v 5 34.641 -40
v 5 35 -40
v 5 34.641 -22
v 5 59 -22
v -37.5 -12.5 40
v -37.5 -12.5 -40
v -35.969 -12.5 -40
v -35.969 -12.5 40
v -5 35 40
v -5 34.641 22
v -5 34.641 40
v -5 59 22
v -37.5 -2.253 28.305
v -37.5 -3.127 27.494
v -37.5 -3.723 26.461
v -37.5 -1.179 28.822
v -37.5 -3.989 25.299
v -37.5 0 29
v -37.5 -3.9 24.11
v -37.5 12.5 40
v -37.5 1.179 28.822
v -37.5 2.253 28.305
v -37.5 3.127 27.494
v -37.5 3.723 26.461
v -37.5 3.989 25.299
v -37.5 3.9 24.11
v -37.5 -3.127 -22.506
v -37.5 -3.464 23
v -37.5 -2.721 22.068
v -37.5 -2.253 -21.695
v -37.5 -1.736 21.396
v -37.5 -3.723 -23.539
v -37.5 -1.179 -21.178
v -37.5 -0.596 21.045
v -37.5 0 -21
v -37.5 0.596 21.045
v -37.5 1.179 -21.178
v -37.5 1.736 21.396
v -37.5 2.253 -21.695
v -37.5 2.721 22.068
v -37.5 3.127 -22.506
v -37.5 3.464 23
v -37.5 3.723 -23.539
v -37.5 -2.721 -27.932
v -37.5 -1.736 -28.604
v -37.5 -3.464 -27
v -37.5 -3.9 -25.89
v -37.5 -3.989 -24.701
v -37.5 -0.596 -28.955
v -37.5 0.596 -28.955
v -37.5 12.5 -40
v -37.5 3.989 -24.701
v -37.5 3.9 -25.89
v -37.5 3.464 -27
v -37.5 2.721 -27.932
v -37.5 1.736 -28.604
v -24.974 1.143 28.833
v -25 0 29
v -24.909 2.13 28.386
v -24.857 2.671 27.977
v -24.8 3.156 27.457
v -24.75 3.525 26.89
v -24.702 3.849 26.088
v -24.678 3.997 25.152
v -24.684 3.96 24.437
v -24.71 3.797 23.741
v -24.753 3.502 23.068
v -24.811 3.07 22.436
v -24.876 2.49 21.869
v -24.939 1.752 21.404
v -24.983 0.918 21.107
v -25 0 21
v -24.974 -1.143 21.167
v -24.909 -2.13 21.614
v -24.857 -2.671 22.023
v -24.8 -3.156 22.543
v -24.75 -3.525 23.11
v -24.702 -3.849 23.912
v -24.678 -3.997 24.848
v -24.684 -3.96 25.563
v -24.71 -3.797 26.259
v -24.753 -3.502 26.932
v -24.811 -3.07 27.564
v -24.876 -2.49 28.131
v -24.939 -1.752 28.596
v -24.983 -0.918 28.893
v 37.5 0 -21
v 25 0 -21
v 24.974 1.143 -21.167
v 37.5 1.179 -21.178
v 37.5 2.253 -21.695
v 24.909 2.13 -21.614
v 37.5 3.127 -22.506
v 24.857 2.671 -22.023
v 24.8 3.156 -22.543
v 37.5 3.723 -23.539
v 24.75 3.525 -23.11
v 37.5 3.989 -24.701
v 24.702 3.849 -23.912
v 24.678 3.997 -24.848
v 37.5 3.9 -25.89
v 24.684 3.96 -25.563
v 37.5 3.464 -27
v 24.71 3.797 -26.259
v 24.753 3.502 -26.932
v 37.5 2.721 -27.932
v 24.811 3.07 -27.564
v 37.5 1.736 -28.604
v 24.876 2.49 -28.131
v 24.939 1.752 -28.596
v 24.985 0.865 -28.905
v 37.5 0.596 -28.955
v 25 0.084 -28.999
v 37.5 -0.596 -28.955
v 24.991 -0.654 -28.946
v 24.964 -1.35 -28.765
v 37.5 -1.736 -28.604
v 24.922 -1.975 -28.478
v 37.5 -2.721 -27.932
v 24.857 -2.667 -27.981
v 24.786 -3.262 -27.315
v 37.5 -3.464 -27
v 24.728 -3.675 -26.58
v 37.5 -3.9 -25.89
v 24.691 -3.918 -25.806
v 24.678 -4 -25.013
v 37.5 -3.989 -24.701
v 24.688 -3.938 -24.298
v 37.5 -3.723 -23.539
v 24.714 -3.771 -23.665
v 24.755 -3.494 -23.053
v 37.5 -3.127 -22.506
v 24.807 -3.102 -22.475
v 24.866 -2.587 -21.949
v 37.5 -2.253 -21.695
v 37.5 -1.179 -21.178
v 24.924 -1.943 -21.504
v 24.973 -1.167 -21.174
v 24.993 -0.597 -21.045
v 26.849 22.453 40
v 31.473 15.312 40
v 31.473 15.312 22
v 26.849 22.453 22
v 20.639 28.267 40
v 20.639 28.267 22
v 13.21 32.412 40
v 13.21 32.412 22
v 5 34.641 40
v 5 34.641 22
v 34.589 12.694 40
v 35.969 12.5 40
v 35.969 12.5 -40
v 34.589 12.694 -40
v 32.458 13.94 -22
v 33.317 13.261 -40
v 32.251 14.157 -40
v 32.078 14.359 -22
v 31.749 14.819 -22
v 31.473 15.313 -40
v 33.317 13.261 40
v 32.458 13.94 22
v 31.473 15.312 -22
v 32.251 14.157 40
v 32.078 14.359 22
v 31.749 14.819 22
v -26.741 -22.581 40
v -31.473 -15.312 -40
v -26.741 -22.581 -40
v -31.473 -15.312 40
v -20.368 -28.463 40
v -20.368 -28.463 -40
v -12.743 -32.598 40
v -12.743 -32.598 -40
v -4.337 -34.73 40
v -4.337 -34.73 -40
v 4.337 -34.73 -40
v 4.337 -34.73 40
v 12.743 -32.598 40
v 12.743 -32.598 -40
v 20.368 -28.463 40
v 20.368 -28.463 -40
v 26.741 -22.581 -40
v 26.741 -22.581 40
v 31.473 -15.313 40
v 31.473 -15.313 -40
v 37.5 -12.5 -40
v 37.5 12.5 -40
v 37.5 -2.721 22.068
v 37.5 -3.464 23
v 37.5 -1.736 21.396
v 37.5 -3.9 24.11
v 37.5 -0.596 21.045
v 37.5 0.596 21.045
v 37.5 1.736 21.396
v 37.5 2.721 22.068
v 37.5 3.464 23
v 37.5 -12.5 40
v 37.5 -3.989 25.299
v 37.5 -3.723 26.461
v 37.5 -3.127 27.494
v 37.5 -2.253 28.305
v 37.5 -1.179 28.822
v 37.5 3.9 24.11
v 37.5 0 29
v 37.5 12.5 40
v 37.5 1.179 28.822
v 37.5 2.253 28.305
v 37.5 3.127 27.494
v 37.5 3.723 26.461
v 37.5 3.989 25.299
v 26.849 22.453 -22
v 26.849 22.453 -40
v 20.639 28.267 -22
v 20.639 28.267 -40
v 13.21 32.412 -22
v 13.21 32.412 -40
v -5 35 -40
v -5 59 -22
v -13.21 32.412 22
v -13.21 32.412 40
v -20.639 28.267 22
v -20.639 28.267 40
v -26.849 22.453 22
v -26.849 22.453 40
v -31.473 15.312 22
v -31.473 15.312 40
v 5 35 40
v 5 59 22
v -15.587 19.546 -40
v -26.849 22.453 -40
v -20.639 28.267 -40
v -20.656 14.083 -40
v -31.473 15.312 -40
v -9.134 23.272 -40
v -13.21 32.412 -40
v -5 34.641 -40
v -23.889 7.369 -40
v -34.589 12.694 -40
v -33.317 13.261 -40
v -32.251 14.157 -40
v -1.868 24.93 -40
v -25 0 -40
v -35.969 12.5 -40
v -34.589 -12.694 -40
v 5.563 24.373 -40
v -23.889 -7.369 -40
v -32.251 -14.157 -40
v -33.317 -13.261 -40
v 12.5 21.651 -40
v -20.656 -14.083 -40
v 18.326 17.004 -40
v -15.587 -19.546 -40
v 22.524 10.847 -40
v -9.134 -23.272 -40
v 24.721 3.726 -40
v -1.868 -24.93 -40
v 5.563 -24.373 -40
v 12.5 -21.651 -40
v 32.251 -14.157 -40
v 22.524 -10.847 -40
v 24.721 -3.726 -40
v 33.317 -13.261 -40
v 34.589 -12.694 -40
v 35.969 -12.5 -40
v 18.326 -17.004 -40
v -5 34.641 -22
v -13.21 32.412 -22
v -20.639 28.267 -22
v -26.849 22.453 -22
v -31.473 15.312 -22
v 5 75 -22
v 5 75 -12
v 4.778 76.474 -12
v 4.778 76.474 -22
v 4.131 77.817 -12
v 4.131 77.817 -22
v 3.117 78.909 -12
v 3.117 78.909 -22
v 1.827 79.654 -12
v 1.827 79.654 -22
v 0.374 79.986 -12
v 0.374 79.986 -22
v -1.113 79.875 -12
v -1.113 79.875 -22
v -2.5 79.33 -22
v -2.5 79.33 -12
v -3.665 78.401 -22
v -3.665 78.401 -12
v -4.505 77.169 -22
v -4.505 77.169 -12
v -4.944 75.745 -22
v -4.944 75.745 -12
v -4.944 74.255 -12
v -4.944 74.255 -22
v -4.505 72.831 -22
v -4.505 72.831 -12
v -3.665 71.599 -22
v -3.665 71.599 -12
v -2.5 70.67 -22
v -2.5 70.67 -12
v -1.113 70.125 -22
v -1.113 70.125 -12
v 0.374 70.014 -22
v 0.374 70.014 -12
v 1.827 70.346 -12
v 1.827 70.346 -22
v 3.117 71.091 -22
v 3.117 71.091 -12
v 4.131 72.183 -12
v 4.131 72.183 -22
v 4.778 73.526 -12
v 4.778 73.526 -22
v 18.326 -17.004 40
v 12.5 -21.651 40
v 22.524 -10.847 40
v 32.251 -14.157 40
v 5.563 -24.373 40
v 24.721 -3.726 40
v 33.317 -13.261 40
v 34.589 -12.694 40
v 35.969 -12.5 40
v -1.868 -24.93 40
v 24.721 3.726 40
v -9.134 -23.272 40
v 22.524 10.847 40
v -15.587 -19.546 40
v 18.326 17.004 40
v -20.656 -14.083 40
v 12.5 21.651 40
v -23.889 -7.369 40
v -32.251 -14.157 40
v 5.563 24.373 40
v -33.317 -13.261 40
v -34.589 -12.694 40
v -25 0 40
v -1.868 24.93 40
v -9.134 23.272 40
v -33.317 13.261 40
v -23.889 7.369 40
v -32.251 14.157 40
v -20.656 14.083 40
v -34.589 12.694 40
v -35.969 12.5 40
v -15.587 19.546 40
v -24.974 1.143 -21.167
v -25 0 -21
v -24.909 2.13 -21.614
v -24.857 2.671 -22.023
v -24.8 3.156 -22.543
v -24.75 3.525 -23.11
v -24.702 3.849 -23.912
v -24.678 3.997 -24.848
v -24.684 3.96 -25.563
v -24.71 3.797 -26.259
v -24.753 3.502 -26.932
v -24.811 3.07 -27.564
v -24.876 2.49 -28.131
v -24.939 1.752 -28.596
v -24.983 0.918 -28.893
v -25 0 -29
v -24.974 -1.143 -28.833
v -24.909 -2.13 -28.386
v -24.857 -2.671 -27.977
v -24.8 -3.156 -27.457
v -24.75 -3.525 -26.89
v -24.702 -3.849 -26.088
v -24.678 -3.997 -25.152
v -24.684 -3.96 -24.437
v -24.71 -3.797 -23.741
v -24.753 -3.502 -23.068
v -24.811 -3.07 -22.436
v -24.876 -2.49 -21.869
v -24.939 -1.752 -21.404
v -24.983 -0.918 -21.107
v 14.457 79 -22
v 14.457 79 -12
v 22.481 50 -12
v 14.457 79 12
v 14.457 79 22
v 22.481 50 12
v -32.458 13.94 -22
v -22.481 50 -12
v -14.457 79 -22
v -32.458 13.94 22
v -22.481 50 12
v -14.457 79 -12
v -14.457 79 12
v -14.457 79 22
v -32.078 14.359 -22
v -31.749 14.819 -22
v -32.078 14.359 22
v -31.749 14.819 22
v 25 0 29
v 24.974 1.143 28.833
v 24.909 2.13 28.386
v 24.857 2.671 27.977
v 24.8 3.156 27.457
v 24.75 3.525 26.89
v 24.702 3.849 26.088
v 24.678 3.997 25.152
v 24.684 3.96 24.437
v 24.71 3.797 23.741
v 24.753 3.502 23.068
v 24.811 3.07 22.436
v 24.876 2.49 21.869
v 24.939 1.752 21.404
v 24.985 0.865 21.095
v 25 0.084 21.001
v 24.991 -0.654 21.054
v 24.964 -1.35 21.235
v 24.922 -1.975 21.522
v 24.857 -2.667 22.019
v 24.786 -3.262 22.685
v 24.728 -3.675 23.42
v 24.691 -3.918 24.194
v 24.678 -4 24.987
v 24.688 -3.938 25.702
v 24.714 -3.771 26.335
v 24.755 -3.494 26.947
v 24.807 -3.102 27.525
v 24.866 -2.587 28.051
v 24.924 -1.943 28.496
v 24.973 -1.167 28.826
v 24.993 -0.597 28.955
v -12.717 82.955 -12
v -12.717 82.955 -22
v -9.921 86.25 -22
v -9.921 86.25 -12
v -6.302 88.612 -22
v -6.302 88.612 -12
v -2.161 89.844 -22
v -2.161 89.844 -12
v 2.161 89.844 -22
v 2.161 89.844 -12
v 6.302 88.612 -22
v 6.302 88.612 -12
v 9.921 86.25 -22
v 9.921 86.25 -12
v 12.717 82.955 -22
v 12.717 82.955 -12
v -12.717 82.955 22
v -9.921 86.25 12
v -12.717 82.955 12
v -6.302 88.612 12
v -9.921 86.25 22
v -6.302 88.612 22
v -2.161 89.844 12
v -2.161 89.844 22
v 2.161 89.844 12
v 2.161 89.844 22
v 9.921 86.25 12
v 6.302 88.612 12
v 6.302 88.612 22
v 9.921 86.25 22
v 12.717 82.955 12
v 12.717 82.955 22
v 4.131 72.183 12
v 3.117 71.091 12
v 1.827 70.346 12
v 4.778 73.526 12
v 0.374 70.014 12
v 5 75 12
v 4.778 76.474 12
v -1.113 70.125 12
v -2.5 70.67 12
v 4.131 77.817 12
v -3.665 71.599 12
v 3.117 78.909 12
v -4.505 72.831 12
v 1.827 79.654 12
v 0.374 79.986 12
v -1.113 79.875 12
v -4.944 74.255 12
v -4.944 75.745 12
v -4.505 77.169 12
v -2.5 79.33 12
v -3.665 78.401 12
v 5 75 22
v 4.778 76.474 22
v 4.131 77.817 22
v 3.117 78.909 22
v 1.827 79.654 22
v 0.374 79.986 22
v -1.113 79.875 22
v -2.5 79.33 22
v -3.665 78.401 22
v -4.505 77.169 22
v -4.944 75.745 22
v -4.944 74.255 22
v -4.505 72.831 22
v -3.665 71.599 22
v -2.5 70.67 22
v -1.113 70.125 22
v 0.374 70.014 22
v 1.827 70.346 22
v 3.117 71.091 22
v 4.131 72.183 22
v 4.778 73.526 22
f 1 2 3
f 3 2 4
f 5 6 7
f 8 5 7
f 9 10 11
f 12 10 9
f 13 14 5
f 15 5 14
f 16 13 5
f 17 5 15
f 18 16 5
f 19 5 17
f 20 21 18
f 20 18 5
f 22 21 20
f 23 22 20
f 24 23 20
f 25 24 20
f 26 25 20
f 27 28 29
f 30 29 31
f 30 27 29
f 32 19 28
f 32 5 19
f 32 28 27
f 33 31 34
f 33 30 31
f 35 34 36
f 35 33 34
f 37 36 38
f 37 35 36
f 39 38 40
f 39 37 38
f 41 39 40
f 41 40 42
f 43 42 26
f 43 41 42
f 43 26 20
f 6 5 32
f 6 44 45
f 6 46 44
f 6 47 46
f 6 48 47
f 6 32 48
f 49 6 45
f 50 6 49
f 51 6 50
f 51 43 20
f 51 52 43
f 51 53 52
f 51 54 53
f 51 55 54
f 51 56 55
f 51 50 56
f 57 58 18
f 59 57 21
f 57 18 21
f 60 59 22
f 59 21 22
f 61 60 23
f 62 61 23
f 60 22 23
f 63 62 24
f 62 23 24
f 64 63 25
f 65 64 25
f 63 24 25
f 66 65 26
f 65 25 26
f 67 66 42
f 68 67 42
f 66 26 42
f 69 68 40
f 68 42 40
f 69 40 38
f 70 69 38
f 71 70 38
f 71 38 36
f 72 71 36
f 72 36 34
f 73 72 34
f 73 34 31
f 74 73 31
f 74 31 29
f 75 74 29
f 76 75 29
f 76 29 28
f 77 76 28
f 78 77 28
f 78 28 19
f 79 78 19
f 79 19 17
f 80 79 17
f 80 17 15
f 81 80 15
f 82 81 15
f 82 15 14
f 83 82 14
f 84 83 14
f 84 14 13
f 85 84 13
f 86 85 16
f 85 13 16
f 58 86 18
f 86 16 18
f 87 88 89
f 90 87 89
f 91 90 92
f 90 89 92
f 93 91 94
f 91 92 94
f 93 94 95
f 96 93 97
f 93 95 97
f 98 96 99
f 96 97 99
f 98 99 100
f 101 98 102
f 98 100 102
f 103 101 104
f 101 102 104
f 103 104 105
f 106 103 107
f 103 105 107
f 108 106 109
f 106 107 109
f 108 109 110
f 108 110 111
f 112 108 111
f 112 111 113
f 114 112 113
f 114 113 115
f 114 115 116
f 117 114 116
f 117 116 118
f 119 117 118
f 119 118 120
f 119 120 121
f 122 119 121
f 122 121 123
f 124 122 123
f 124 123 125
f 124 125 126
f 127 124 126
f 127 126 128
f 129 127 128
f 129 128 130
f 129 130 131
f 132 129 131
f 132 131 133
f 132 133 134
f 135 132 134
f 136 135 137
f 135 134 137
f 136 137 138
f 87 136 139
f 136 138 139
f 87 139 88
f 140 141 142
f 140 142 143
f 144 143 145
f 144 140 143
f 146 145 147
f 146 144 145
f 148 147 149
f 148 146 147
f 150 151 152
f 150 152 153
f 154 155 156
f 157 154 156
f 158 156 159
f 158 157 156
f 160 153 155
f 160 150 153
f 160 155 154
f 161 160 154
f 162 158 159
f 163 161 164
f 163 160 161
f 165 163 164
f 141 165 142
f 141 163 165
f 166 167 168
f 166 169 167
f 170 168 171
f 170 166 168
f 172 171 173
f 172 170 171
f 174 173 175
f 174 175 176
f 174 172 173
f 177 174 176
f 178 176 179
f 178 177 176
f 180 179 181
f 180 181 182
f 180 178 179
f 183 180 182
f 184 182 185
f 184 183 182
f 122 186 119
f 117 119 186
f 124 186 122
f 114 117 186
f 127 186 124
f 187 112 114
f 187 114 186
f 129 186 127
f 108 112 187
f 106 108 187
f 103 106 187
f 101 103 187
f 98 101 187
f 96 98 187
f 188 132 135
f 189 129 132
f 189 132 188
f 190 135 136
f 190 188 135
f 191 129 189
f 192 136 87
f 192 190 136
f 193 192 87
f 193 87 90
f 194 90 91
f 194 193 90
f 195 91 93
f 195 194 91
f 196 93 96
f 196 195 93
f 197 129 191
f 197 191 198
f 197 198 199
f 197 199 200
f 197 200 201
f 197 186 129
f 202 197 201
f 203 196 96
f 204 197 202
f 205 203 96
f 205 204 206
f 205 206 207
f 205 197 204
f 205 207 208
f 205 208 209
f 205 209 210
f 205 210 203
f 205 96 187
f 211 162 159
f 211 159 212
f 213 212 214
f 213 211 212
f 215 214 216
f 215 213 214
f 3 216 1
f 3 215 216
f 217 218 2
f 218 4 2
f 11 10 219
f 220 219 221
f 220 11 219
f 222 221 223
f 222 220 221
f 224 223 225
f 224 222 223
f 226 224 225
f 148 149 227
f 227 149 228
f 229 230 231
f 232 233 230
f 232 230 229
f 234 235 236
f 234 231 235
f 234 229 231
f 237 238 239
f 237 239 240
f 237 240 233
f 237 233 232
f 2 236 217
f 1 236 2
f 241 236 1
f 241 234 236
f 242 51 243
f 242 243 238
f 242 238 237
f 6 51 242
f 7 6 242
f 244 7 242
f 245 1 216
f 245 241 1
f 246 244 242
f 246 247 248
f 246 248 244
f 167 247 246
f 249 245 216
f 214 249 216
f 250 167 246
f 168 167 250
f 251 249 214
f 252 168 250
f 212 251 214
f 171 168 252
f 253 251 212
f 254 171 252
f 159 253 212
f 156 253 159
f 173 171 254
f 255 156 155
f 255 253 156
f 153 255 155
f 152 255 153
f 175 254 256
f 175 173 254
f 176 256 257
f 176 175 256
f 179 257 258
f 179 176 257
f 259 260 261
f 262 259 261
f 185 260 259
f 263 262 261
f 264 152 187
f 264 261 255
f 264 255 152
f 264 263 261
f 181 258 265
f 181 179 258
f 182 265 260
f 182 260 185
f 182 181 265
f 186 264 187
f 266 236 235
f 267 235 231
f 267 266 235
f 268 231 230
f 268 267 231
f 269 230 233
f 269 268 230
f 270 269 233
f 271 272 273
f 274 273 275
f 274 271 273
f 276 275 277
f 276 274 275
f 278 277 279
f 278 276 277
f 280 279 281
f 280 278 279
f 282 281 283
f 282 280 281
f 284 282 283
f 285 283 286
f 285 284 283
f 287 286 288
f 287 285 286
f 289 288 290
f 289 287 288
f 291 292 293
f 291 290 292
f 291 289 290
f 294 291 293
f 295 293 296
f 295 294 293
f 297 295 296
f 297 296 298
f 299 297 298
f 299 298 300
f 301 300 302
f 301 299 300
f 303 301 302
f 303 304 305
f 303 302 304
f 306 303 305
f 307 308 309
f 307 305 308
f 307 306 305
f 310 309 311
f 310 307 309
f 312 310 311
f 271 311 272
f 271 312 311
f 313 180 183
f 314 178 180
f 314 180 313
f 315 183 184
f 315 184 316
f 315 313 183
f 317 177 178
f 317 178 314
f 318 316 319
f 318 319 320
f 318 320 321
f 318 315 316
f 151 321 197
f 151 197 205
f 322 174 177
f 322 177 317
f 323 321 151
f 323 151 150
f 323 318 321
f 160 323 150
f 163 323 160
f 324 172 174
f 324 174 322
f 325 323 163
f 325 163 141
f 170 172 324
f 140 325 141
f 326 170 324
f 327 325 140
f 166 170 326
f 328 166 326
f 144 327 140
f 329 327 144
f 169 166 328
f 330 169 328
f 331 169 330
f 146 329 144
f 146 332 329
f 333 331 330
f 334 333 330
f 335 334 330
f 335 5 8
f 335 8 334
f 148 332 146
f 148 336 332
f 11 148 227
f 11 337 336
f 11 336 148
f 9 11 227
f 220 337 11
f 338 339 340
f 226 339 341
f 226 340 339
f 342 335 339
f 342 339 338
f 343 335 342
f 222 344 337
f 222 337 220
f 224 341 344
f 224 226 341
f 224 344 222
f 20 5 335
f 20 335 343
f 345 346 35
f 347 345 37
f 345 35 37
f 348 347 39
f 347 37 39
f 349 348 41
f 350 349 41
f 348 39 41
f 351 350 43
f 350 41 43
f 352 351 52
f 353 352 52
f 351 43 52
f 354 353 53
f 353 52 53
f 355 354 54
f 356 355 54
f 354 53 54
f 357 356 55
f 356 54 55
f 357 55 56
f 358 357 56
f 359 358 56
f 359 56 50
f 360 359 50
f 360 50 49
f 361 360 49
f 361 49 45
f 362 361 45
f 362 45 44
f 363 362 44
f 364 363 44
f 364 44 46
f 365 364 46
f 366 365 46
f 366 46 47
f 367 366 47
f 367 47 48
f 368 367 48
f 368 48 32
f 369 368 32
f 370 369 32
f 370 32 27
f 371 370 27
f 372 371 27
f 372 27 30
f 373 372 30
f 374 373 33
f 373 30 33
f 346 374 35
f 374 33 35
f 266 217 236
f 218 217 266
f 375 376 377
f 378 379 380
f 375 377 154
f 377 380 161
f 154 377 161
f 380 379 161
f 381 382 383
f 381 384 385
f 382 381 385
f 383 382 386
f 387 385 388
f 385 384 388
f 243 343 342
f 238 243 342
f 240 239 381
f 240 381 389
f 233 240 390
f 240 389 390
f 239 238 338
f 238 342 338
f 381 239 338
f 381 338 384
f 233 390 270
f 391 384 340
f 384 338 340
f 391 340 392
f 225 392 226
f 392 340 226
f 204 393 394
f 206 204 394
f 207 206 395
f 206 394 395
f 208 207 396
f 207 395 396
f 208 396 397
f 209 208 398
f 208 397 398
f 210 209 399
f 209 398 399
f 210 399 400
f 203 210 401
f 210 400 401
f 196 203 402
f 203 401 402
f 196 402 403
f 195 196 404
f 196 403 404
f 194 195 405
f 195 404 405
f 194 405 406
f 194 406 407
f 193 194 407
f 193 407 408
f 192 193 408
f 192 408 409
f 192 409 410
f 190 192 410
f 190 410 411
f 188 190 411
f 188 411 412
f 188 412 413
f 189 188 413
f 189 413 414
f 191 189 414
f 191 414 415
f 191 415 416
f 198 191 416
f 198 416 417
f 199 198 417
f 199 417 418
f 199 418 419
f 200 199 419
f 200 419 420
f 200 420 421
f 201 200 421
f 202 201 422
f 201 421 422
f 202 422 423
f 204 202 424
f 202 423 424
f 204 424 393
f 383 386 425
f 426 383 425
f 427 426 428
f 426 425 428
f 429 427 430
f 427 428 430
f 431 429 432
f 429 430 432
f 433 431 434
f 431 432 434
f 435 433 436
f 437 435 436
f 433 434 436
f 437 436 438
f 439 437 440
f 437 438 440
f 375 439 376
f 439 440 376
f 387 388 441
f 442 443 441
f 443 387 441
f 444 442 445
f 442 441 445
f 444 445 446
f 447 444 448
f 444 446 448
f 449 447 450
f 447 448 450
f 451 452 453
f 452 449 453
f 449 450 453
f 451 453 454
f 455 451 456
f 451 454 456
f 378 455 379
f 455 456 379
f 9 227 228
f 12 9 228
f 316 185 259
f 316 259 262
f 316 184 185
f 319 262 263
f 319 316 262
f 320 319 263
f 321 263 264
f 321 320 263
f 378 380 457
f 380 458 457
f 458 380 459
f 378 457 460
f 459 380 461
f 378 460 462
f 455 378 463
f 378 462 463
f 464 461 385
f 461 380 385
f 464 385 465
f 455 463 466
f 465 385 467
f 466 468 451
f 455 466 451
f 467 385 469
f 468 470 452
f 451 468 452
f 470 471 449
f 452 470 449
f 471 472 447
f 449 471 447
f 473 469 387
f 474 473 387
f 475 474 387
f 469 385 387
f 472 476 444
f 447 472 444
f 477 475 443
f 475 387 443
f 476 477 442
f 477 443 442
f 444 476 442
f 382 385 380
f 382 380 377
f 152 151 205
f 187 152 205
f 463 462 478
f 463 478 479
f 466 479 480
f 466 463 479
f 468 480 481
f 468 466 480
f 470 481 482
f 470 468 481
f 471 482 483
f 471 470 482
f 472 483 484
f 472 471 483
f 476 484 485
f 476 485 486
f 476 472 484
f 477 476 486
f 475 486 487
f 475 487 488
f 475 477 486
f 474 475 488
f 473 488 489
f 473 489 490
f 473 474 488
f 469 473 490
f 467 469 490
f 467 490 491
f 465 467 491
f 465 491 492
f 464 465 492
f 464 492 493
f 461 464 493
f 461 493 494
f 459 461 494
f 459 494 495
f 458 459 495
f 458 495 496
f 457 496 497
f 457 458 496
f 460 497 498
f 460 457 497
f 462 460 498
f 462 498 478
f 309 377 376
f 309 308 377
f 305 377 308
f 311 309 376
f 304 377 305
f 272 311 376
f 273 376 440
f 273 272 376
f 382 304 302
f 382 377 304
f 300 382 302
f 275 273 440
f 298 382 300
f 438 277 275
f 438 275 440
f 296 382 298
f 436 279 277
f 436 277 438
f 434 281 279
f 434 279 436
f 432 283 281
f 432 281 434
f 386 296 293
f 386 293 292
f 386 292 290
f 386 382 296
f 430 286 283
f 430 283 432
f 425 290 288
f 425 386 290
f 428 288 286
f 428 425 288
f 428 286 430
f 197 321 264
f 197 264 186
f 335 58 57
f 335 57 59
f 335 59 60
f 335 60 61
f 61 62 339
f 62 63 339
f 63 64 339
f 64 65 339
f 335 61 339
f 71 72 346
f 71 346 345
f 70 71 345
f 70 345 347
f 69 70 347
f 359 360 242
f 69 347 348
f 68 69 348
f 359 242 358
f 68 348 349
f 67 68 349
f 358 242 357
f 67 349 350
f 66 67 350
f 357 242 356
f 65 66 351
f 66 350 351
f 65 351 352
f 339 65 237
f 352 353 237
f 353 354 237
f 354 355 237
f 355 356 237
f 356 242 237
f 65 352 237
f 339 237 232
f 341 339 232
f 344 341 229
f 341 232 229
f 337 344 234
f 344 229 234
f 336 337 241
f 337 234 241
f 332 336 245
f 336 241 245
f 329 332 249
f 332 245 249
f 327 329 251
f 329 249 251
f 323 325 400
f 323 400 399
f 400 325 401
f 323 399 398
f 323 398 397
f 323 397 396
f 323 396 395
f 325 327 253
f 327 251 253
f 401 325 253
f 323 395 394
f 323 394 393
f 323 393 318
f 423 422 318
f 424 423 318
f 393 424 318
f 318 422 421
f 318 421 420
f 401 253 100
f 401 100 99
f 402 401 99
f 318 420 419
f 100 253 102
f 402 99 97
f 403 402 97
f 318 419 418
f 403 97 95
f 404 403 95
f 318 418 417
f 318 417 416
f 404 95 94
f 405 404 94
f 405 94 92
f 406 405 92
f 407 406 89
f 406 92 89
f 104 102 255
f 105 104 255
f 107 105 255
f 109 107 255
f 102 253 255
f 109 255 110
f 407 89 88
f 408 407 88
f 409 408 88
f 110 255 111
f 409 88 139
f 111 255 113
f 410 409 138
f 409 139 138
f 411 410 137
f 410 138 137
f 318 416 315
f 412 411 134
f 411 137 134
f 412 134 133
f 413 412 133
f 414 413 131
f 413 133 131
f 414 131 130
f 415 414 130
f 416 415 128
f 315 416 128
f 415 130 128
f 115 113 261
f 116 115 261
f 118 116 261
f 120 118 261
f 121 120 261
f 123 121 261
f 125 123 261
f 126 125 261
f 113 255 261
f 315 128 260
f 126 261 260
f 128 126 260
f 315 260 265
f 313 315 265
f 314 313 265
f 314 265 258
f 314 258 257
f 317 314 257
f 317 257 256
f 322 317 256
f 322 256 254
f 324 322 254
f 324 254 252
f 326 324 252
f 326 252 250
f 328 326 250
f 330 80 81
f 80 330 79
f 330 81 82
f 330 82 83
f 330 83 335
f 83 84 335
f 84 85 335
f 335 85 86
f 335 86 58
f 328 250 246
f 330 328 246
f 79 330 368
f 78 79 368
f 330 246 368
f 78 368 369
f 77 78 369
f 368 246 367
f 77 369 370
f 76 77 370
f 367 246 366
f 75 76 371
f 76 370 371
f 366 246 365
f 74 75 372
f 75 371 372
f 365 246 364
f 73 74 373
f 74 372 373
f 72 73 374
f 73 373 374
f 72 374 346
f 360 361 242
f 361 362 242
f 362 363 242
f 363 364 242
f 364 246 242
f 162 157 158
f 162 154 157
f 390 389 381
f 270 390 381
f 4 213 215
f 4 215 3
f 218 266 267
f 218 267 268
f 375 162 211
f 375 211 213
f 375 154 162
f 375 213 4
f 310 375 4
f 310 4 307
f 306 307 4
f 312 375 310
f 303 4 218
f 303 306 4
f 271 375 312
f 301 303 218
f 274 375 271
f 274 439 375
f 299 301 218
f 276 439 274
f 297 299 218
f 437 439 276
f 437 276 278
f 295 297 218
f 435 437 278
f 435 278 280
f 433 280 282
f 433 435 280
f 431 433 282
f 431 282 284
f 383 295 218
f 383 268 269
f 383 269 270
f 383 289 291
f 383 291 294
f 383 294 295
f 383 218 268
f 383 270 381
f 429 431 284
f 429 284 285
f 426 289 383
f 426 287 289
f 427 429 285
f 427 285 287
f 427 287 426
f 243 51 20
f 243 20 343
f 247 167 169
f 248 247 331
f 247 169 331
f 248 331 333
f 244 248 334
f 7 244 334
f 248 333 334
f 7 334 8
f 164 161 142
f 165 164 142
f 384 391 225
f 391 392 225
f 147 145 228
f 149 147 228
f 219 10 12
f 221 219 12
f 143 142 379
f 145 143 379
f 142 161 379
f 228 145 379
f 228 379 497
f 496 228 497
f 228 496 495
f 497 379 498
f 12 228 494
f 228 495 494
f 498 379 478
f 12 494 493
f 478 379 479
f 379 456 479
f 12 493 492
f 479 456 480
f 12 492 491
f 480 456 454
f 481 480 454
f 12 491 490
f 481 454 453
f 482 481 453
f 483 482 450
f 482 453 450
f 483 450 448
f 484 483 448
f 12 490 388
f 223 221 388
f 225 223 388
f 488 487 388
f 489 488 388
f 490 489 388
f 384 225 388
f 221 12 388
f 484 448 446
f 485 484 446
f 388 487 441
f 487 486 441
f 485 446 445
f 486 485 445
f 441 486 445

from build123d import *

# Parameters (mm, degrees)
SKETCH1_R                       = 35
BOSS_EXTRUDE1_DEPTH             = 40
SKETCH2_R                       = 5
BOSS_EXTRUDE2_DEPTH             = 22
BOSS_EXTRUDE3_DEPTH             = 5
HOLE1_D                         = 50
BOSS_EXTRUDE4_REACH             = 106.523
SKETCH7_W                       = 75
SKETCH7_H                       = 25
BOSS_EXTRUDE4_DIRECTION_2_REACH = 106.523
HOLE2_D                         = 50
CUT_EXTRUDE1_DEPTH              = 106.386194542
CUT_EXTRUDE1_DEPTH_BACK         = 106.386194542
SKETCH11_W                      = 24
SKETCH11_H                      = 40
HOLE3_D                         = 8
FILLET1_R                       = 5


with BuildPart() as part:
    # Sketch1 → Boss-Extrude1 (new, symmetric)
    with BuildSketch(Plane.XY):
        Circle(SKETCH1_R)
    extrude(amount=BOSS_EXTRUDE1_DEPTH, both=True)

    # Sketch2 → Boss-Extrude2 (add, symmetric)
    with BuildSketch(Plane.XY):
        with BuildLine():
            Line((-33.732608688, 9.333333333), (-14.456832295, 79))
            ThreePointArc((-14.456832295, 79), (0, 90), (14.456832295, 79))
            Line((14.456832295, 79), (33.732608688, 9.333333333))
            ThreePointArc((33.732608688, 9.333333333), (0, 35), (-33.732608688, 9.333333333))
        make_face()
        with Locations((0, 75)):
            Circle(SKETCH2_R, mode=Mode.SUBTRACT)
    extrude(amount=BOSS_EXTRUDE2_DEPTH, both=True)

    # Sketch3 → Boss-Extrude3 (add, symmetric)
    with BuildSketch(Plane(origin=(0, 0, 0), x_dir=(0, 0, -1), z_dir=(1, 0, 0))):
        Polygon((-40, 35), (-22, 59), (22, 59), (40, 35), (40, 0), (-40, 0), align=None)
    extrude(amount=BOSS_EXTRUDE3_DEPTH, both=True)

    # Hole1 (through all)
    with Locations(Plane.XY.offset(40)):
        with Locations((0, 0)):
            Hole(HOLE1_D / 2)

    # Boss-Extrude4: up to this face of the body (flat: up to its plane)
    boss_extrude4_end = Plane(part.part.faces().sort_by_distance((0, -34.010050506, -40))[0])
    # Sketch7 → Boss-Extrude4 (add, up to the picked face)
    with BuildSketch(Plane.XY, mode=Mode.PRIVATE) as boss_extrude4_sk1:
        Rectangle(SKETCH7_W, SKETCH7_H)
    boss_extrude4_tool1 = split(extrude(boss_extrude4_sk1.sketch, amount=-BOSS_EXTRUDE4_REACH, mode=Mode.PRIVATE), bisect_by=boss_extrude4_end, keep=Keep.BOTH, mode=Mode.PRIVATE)
    add(boss_extrude4_tool1.solids().sort_by(Axis((0, 0, 0), (0, 0, -1)))[0])

    # Boss-Extrude4 direction 2: up to this face of the body (flat: up to its plane)
    boss_extrude4_direction_2_end = Plane(part.part.faces().sort_by_distance((0, -34.010050506, 40))[0])
    # Sketch7 → Boss-Extrude4 direction 2 (add, up to the picked face)
    with BuildSketch(Plane.XY, mode=Mode.PRIVATE) as boss_extrude4_direction_2_sk1:
        Rectangle(SKETCH7_W, SKETCH7_H)
    boss_extrude4_direction_2_tool1 = split(extrude(boss_extrude4_direction_2_sk1.sketch, amount=BOSS_EXTRUDE4_DIRECTION_2_REACH, mode=Mode.PRIVATE), bisect_by=boss_extrude4_direction_2_end, keep=Keep.BOTH, mode=Mode.PRIVATE)
    add(boss_extrude4_direction_2_tool1.solids().sort_by(Axis((0, 0, 0), (0, 0, 1)))[0])

    # Hole2 (through all)
    with Locations(Plane.XY.offset(40)):
        with Locations((0, 0)):
            Hole(HOLE2_D / 2)

    # Sketch11 → Cut-Extrude1 (cut, two sides: drawn at the far end of the back side and taken through both)
    with BuildSketch(Plane(origin=(0, 0, 0), x_dir=(0, 0, -1), z_dir=(1, 0, 0)).offset(-CUT_EXTRUDE1_DEPTH_BACK)):
        with Locations((0, 70)):
            Rectangle(SKETCH11_W, SKETCH11_H)
    extrude(amount=CUT_EXTRUDE1_DEPTH + CUT_EXTRUDE1_DEPTH_BACK, mode=Mode.SUBTRACT)

    # Hole3 (through all)
    with Locations(Plane(origin=(37.5, 0, 0), x_dir=(0, 0, -1), z_dir=(1, 0, 0))):
        with Locations((-25, 0), (25, 0)):
            Hole(HOLE3_D / 2)

    # Fillet1
    fillet1_edges = [part.edges().sort_by_distance(p)[0] for p in [
        (-32.691742077, 12.5, 31),
    ]]
    fillet(fillet1_edges, radius=FILLET1_R - 0.0001)  # a hair under: the kernel refuses the full size
    fillet1_2_edges = [part.edges().sort_by_distance(p)[0] for p in [
        (32.691742077, 12.5, 31),
    ]]
    fillet(fillet1_2_edges, radius=FILLET1_R)
    fillet1_3_edges = [part.edges().sort_by_distance(p)[0] for p in [
        (-32.691742077, -12.5, 0),
    ]]
    fillet(fillet1_3_edges, radius=FILLET1_R)
    fillet1_4_edges = [part.edges().sort_by_distance(p)[0] for p in [
        (32.691742077, -12.5, 0),
    ]]
    fillet(fillet1_4_edges, radius=FILLET1_R)


solid = part.part
